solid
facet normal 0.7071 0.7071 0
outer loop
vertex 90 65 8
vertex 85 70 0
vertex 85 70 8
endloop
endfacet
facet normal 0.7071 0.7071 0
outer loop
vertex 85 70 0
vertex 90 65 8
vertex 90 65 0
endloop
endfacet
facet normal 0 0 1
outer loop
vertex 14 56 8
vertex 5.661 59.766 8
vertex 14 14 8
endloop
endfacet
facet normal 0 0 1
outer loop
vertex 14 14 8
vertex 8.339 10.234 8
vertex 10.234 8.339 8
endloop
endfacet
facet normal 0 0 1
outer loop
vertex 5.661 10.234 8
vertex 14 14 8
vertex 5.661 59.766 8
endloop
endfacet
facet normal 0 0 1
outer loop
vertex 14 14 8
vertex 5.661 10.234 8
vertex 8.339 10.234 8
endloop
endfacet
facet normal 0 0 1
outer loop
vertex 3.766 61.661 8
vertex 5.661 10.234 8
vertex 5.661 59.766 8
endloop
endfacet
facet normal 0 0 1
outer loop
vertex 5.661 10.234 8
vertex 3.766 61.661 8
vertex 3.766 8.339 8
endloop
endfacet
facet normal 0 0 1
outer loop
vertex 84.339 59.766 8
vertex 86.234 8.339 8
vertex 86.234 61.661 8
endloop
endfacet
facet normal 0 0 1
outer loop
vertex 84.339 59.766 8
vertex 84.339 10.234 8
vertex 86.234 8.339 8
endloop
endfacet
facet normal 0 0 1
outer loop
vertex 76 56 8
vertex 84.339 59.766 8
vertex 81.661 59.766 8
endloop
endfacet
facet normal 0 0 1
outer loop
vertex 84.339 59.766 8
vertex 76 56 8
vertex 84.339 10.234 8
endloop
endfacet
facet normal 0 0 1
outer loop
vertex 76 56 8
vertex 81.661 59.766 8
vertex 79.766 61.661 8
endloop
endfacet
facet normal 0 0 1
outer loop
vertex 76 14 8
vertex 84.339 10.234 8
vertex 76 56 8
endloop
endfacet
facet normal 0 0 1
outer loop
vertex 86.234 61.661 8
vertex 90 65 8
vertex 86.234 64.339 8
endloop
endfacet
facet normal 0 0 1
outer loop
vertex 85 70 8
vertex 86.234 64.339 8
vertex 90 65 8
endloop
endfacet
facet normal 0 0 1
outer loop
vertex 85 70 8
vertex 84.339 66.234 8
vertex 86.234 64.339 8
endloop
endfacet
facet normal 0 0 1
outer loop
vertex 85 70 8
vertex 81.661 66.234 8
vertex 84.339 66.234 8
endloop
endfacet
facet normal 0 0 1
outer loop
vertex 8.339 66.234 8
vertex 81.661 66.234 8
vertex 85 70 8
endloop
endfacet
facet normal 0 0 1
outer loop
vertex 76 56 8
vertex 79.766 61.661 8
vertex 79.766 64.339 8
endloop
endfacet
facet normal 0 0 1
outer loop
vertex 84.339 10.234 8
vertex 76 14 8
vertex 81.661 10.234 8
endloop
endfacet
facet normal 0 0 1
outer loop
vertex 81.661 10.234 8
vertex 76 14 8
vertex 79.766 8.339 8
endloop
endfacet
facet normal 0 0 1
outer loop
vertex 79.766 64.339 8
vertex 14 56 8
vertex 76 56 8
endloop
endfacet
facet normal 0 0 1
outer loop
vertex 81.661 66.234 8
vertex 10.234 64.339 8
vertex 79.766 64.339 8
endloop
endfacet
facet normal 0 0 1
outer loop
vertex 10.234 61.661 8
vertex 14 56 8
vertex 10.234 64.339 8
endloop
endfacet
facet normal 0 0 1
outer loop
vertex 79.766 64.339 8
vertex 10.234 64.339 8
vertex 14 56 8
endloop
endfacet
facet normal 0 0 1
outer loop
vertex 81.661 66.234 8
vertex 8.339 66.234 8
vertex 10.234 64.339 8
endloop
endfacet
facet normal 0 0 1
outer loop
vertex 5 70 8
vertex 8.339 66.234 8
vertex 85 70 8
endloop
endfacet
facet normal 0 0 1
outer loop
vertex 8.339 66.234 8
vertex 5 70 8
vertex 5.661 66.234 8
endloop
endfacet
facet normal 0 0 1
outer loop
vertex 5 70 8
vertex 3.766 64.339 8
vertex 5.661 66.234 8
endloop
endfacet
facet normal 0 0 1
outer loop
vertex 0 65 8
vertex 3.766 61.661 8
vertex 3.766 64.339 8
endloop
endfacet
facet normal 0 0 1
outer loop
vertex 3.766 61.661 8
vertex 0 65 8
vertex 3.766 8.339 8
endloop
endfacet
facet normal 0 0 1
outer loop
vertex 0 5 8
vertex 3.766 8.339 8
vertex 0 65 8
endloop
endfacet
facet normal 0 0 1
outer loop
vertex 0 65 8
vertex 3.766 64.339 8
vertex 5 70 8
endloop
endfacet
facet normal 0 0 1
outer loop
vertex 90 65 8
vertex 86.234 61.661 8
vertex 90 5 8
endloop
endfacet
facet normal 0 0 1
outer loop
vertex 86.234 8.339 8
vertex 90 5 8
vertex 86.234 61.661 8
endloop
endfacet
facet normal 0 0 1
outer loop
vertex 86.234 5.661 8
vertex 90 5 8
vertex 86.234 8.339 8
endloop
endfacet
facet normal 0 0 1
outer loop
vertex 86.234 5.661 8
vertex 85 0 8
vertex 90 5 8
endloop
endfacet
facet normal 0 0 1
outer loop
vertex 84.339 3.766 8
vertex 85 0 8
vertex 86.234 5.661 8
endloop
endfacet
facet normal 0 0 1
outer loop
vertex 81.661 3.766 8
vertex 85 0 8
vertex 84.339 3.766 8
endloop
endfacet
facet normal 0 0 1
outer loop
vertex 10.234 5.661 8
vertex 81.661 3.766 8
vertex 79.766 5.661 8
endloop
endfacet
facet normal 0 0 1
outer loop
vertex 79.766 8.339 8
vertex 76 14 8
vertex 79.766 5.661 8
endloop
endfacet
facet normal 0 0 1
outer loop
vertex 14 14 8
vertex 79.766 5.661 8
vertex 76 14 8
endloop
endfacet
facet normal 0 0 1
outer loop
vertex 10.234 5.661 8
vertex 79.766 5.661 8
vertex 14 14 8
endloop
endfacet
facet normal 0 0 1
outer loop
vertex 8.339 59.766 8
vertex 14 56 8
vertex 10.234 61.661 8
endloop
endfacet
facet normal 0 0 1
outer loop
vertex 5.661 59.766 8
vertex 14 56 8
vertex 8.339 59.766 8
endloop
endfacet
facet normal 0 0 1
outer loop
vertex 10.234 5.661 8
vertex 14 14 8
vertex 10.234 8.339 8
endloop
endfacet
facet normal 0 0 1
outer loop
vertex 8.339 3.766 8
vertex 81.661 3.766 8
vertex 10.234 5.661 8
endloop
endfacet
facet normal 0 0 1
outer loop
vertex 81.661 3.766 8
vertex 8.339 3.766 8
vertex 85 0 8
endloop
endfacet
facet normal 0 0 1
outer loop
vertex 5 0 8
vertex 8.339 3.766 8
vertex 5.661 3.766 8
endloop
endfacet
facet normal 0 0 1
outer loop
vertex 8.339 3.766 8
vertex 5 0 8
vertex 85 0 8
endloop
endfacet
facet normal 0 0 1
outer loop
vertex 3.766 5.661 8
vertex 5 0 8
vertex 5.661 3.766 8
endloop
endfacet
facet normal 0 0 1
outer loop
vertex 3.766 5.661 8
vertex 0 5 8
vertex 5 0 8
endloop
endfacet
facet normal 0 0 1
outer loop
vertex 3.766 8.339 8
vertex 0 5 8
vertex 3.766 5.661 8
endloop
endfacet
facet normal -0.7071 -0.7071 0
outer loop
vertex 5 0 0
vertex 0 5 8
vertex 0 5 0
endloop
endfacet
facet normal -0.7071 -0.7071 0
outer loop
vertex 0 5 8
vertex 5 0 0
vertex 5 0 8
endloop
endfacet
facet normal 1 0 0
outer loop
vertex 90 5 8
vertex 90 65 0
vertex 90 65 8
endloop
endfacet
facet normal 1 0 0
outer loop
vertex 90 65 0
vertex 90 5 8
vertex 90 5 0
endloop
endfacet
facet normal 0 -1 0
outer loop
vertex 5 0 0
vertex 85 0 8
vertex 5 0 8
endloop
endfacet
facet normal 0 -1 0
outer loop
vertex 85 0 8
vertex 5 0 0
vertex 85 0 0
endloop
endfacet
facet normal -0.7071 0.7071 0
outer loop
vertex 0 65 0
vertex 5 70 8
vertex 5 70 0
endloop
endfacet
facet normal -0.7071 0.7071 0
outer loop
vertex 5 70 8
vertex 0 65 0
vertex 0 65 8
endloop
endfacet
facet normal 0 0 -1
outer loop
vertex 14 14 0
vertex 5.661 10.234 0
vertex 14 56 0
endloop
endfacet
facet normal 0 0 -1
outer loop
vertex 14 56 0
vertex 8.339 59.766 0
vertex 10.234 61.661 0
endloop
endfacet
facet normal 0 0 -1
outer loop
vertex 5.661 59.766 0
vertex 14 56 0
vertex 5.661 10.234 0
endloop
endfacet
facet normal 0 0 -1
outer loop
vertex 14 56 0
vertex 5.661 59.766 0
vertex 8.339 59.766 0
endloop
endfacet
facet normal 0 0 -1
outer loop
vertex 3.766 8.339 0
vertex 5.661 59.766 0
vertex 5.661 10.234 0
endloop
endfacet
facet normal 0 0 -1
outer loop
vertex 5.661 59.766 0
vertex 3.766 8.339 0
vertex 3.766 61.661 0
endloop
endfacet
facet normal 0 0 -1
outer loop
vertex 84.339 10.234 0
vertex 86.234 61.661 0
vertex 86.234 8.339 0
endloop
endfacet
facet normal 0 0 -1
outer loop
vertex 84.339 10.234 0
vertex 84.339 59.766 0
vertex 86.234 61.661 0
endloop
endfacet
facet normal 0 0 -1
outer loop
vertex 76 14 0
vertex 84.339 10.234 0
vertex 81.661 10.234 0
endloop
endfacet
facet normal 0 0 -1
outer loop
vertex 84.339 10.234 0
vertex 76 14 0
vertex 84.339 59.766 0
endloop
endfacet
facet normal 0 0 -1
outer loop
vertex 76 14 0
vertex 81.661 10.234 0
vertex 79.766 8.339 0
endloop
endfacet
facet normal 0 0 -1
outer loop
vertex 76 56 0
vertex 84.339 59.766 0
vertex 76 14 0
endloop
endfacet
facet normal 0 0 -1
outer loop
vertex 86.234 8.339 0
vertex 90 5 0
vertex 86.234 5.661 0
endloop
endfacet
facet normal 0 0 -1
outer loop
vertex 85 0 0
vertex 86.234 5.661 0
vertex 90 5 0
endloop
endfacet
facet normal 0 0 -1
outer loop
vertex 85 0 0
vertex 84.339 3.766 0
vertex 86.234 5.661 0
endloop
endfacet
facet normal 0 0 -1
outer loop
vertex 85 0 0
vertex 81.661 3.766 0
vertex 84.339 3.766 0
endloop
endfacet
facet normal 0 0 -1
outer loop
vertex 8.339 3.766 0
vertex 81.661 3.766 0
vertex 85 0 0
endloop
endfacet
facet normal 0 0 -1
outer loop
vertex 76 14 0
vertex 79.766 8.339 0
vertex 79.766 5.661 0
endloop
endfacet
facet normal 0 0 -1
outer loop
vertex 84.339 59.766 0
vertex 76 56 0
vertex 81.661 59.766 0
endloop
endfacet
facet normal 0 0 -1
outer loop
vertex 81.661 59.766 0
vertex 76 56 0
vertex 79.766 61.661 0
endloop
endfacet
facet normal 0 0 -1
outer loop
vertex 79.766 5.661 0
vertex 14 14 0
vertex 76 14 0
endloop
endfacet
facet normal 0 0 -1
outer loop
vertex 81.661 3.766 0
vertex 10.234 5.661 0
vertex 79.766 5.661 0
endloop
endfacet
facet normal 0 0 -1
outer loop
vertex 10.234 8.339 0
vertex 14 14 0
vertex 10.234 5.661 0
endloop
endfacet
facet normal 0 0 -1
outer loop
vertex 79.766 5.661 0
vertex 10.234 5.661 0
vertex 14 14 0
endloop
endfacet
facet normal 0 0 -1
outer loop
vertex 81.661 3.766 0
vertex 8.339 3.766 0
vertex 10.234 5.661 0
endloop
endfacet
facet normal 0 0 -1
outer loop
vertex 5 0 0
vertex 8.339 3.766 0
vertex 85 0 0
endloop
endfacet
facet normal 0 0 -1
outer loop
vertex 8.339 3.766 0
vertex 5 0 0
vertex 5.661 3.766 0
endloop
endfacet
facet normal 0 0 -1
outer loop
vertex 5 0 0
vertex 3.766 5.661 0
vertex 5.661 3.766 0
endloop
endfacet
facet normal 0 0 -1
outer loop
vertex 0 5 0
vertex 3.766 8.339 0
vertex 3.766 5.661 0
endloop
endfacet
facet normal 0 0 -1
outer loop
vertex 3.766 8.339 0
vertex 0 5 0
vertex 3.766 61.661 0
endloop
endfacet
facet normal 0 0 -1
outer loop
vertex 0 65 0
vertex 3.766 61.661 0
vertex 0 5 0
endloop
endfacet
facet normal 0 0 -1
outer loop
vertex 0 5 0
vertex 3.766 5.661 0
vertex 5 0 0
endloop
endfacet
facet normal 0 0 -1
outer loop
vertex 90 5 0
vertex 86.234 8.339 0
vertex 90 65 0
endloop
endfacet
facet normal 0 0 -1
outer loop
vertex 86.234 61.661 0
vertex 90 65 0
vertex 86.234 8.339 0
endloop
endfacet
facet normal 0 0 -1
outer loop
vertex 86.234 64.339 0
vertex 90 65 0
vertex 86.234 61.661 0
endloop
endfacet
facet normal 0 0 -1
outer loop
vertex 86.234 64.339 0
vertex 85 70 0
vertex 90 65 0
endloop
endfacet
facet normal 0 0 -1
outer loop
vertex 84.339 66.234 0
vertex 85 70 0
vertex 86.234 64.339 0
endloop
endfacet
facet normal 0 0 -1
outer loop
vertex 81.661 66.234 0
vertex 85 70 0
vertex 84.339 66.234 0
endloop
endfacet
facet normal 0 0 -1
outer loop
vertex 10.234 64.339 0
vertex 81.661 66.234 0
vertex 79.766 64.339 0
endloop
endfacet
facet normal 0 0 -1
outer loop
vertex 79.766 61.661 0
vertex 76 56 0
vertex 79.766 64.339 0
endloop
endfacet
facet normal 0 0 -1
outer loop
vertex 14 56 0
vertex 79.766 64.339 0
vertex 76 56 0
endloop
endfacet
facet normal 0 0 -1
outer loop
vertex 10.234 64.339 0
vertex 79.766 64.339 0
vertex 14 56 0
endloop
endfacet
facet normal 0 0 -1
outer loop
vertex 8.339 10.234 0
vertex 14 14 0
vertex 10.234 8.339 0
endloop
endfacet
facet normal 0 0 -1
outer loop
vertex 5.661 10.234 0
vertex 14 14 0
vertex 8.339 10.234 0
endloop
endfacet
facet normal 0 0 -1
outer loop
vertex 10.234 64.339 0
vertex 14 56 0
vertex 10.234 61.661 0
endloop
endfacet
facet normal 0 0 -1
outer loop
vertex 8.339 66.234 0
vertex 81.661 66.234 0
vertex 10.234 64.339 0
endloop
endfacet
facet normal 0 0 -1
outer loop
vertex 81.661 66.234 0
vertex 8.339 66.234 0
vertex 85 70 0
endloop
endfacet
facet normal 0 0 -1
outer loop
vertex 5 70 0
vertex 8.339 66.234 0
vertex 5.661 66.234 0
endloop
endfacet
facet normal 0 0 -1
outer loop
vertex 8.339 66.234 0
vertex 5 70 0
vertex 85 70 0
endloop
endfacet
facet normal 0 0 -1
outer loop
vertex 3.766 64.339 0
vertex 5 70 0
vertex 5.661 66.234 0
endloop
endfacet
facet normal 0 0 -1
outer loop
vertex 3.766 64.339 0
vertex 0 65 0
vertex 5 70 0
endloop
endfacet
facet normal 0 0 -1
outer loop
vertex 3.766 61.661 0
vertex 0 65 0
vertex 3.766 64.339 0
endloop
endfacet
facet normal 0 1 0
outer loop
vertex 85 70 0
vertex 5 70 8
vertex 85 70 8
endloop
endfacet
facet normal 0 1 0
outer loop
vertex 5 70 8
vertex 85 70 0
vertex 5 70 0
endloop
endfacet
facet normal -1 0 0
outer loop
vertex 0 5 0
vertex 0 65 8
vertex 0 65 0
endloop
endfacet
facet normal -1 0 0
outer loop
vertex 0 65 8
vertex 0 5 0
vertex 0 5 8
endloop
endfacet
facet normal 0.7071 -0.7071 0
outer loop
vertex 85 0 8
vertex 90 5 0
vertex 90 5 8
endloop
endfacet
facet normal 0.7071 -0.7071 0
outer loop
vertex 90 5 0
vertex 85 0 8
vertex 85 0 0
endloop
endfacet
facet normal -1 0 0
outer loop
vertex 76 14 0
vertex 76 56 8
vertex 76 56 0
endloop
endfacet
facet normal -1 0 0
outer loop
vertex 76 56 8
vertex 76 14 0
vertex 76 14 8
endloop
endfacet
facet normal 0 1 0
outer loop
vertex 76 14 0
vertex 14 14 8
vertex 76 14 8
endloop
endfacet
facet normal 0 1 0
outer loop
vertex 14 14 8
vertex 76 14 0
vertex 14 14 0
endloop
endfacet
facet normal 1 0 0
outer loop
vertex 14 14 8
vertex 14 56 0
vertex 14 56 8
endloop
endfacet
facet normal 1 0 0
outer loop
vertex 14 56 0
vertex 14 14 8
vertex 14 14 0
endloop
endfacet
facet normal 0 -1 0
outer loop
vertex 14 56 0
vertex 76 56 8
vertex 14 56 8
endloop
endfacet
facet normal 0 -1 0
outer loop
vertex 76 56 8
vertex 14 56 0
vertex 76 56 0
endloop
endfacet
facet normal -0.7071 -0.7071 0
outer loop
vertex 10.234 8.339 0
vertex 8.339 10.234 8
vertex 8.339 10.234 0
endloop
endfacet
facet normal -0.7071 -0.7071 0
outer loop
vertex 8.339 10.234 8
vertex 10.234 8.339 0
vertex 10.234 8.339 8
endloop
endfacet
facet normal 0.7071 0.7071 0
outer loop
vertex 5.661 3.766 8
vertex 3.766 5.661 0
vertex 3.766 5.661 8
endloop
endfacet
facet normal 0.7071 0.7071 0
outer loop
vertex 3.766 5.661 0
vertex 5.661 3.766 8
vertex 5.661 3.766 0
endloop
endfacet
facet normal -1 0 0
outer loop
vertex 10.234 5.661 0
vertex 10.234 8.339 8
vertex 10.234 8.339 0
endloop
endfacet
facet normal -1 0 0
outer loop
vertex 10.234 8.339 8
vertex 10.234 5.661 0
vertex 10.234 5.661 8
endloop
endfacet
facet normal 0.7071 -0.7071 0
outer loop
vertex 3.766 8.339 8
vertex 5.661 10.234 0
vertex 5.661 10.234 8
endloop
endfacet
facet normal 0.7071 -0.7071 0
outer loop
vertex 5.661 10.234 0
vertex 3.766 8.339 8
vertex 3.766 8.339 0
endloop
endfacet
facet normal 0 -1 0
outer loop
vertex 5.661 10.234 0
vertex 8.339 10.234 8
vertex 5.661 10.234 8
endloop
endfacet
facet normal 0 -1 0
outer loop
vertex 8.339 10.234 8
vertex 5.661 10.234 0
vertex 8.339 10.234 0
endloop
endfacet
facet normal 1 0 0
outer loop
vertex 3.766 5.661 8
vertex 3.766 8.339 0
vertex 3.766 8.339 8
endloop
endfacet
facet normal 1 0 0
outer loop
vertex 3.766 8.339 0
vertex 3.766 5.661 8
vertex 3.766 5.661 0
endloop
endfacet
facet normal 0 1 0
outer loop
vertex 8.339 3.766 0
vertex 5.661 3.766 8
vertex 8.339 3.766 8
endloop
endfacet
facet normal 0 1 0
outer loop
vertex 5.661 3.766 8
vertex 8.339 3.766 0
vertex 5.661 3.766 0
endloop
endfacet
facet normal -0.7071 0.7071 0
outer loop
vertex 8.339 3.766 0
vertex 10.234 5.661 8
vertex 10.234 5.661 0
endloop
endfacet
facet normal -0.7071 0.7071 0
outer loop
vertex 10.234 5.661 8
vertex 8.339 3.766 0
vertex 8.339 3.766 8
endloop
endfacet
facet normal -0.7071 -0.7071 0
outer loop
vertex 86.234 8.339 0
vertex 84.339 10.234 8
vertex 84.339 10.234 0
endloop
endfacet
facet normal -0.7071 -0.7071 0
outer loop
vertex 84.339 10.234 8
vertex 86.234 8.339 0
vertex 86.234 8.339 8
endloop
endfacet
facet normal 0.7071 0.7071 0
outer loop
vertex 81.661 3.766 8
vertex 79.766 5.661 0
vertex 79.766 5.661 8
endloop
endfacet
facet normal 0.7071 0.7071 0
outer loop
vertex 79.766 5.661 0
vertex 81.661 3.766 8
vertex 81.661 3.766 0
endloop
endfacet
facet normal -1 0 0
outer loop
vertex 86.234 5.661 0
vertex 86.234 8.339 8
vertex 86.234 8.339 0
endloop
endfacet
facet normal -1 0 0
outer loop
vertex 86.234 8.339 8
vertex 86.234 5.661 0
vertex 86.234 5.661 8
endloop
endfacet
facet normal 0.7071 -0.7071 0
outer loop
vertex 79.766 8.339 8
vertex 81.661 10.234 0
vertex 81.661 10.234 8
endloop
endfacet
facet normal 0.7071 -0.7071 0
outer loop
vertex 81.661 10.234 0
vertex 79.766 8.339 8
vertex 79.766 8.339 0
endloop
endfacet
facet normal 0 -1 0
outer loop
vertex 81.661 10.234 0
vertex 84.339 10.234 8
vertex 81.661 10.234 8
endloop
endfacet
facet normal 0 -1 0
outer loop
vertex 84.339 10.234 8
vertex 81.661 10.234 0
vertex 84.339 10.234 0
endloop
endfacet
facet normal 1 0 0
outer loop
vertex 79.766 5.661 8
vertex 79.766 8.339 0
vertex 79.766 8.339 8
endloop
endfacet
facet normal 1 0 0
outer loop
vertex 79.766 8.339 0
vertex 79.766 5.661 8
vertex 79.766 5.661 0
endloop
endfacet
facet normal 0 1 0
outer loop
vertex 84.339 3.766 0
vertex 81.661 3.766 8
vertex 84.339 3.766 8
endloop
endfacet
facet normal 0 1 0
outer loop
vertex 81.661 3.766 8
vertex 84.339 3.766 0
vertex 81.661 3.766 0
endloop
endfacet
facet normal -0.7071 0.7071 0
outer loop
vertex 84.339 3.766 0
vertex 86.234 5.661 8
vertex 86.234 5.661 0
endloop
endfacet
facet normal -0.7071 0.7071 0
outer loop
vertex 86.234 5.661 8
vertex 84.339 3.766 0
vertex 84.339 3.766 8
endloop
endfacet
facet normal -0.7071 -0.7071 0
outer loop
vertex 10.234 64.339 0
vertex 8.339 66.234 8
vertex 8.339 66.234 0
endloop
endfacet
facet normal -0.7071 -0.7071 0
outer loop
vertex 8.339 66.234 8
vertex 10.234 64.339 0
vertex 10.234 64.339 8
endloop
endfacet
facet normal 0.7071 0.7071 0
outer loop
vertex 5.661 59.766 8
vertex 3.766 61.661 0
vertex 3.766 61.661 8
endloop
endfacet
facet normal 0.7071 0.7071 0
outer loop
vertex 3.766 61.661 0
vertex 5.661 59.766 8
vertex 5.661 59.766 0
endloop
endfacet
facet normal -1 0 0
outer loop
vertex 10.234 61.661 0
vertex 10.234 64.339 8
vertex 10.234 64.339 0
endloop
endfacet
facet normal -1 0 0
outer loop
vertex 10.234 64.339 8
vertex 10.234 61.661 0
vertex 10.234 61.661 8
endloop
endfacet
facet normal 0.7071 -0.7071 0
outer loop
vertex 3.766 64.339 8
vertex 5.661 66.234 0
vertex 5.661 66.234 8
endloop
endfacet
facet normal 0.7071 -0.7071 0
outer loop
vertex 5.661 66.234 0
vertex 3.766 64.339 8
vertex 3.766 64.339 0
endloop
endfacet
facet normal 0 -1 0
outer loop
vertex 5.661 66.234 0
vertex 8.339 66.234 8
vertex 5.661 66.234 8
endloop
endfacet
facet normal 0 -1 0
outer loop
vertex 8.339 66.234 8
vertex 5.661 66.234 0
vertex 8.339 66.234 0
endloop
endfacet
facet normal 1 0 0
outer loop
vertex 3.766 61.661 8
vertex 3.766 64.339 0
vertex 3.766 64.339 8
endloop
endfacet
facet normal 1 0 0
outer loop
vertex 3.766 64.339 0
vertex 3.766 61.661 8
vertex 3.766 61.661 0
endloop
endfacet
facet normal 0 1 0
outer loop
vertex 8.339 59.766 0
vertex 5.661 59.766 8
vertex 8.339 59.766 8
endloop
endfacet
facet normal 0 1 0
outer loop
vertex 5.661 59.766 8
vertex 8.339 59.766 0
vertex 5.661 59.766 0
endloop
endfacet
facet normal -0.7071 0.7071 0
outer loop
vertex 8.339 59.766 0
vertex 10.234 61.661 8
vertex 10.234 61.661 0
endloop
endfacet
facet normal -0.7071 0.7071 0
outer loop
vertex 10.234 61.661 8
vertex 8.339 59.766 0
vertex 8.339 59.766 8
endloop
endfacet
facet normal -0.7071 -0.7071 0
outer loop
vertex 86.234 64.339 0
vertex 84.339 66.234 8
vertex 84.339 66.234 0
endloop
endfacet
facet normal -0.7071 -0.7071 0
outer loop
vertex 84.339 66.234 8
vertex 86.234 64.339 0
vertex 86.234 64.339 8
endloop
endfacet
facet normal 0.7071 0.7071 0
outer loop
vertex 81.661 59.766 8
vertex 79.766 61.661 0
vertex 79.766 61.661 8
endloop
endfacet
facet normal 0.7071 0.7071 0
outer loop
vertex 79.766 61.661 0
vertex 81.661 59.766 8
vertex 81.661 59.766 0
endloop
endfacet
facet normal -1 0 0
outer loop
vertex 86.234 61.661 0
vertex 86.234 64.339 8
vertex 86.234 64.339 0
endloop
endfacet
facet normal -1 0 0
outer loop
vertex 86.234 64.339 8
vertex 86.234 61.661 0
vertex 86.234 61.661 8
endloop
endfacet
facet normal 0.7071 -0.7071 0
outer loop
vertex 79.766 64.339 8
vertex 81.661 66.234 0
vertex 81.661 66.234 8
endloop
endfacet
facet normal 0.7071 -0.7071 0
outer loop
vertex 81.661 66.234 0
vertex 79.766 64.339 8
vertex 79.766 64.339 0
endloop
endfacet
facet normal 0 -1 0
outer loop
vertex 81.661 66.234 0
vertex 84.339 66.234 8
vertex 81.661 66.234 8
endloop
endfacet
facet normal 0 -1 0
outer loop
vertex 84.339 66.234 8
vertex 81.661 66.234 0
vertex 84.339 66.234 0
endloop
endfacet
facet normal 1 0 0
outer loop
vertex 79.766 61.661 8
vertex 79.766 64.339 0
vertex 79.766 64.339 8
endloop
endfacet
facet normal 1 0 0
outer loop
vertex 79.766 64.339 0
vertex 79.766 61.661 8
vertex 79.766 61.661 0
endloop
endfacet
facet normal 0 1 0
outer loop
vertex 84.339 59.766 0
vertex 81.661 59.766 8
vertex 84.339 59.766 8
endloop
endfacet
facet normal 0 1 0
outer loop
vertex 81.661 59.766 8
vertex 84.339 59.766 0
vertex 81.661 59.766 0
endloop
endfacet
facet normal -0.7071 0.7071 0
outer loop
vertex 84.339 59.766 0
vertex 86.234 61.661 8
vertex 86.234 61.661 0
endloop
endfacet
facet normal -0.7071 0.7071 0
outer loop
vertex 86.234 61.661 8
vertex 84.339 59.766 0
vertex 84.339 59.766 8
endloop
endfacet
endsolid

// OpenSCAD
$fn = 32;

// ----------------------------------------------------------------------
// Frame plate: 90 x 70 frame, 14 mm rails
// ----------------------------------------------------------------------

// --- parameters (mm) ---
plate_l = 90;             // plate length, X
plate_w = 70;             // plate width, Y
plate_t = 8;              // plate thickness, Z (extrusion height)
corner_c = 5;             // corner chamfer
frame_bar = 14;           // frame rail width
bolt_r = 3.5;             // corner bolt window radius
bolt_inset = 7;           // bolt centre inset from the edges

win_l = plate_l - 2 * frame_bar;  // window length
win_w = plate_w - 2 * frame_bar;  // window width
bolt_d = 2 * bolt_r;  // corner hole diameter

profile = [[5, 0], [85, 0], [90, 5], [90, 65], [85, 70], [5, 70], [0, 65], [0, 5]];  // primary outline, 8 points, counter clockwise
void_1 = [[14, 14], [76, 14], [76, 56], [14, 56]];  // the window, 4 points
void_2 = [[10.234, 8.339], [8.339, 10.234], [5.661, 10.234], [3.766, 8.339], [3.766, 5.661], [5.661, 3.766], [8.339, 3.766], [10.234, 5.661]];  // corner bolt window, 8 points
void_3 = [[86.234, 8.339], [84.339, 10.234], [81.661, 10.234], [79.766, 8.339], [79.766, 5.661], [81.661, 3.766], [84.339, 3.766], [86.234, 5.661]];  // corner bolt window, 8 points
void_4 = [[10.234, 64.339], [8.339, 66.234], [5.661, 66.234], [3.766, 64.339], [3.766, 61.661], [5.661, 59.766], [8.339, 59.766], [10.234, 61.661]];  // corner bolt window, 8 points
void_5 = [[86.234, 64.339], [84.339, 66.234], [81.661, 66.234], [79.766, 64.339], [79.766, 61.661], [81.661, 59.766], [84.339, 59.766], [86.234, 61.661]];  // corner bolt window, 8 points

// --- the one profile operation ---
difference() {
  linear_extrude(height = plate_t) polygon(points = profile);
  translate([0, 0, -1])
    linear_extrude(height = plate_t + 2) polygon(points = void_1);
  translate([0, 0, -1])
    linear_extrude(height = plate_t + 2) polygon(points = void_2);
  translate([0, 0, -1])
    linear_extrude(height = plate_t + 2) polygon(points = void_3);
  translate([0, 0, -1])
    linear_extrude(height = plate_t + 2) polygon(points = void_4);
  translate([0, 0, -1])
    linear_extrude(height = plate_t + 2) polygon(points = void_5);
}
